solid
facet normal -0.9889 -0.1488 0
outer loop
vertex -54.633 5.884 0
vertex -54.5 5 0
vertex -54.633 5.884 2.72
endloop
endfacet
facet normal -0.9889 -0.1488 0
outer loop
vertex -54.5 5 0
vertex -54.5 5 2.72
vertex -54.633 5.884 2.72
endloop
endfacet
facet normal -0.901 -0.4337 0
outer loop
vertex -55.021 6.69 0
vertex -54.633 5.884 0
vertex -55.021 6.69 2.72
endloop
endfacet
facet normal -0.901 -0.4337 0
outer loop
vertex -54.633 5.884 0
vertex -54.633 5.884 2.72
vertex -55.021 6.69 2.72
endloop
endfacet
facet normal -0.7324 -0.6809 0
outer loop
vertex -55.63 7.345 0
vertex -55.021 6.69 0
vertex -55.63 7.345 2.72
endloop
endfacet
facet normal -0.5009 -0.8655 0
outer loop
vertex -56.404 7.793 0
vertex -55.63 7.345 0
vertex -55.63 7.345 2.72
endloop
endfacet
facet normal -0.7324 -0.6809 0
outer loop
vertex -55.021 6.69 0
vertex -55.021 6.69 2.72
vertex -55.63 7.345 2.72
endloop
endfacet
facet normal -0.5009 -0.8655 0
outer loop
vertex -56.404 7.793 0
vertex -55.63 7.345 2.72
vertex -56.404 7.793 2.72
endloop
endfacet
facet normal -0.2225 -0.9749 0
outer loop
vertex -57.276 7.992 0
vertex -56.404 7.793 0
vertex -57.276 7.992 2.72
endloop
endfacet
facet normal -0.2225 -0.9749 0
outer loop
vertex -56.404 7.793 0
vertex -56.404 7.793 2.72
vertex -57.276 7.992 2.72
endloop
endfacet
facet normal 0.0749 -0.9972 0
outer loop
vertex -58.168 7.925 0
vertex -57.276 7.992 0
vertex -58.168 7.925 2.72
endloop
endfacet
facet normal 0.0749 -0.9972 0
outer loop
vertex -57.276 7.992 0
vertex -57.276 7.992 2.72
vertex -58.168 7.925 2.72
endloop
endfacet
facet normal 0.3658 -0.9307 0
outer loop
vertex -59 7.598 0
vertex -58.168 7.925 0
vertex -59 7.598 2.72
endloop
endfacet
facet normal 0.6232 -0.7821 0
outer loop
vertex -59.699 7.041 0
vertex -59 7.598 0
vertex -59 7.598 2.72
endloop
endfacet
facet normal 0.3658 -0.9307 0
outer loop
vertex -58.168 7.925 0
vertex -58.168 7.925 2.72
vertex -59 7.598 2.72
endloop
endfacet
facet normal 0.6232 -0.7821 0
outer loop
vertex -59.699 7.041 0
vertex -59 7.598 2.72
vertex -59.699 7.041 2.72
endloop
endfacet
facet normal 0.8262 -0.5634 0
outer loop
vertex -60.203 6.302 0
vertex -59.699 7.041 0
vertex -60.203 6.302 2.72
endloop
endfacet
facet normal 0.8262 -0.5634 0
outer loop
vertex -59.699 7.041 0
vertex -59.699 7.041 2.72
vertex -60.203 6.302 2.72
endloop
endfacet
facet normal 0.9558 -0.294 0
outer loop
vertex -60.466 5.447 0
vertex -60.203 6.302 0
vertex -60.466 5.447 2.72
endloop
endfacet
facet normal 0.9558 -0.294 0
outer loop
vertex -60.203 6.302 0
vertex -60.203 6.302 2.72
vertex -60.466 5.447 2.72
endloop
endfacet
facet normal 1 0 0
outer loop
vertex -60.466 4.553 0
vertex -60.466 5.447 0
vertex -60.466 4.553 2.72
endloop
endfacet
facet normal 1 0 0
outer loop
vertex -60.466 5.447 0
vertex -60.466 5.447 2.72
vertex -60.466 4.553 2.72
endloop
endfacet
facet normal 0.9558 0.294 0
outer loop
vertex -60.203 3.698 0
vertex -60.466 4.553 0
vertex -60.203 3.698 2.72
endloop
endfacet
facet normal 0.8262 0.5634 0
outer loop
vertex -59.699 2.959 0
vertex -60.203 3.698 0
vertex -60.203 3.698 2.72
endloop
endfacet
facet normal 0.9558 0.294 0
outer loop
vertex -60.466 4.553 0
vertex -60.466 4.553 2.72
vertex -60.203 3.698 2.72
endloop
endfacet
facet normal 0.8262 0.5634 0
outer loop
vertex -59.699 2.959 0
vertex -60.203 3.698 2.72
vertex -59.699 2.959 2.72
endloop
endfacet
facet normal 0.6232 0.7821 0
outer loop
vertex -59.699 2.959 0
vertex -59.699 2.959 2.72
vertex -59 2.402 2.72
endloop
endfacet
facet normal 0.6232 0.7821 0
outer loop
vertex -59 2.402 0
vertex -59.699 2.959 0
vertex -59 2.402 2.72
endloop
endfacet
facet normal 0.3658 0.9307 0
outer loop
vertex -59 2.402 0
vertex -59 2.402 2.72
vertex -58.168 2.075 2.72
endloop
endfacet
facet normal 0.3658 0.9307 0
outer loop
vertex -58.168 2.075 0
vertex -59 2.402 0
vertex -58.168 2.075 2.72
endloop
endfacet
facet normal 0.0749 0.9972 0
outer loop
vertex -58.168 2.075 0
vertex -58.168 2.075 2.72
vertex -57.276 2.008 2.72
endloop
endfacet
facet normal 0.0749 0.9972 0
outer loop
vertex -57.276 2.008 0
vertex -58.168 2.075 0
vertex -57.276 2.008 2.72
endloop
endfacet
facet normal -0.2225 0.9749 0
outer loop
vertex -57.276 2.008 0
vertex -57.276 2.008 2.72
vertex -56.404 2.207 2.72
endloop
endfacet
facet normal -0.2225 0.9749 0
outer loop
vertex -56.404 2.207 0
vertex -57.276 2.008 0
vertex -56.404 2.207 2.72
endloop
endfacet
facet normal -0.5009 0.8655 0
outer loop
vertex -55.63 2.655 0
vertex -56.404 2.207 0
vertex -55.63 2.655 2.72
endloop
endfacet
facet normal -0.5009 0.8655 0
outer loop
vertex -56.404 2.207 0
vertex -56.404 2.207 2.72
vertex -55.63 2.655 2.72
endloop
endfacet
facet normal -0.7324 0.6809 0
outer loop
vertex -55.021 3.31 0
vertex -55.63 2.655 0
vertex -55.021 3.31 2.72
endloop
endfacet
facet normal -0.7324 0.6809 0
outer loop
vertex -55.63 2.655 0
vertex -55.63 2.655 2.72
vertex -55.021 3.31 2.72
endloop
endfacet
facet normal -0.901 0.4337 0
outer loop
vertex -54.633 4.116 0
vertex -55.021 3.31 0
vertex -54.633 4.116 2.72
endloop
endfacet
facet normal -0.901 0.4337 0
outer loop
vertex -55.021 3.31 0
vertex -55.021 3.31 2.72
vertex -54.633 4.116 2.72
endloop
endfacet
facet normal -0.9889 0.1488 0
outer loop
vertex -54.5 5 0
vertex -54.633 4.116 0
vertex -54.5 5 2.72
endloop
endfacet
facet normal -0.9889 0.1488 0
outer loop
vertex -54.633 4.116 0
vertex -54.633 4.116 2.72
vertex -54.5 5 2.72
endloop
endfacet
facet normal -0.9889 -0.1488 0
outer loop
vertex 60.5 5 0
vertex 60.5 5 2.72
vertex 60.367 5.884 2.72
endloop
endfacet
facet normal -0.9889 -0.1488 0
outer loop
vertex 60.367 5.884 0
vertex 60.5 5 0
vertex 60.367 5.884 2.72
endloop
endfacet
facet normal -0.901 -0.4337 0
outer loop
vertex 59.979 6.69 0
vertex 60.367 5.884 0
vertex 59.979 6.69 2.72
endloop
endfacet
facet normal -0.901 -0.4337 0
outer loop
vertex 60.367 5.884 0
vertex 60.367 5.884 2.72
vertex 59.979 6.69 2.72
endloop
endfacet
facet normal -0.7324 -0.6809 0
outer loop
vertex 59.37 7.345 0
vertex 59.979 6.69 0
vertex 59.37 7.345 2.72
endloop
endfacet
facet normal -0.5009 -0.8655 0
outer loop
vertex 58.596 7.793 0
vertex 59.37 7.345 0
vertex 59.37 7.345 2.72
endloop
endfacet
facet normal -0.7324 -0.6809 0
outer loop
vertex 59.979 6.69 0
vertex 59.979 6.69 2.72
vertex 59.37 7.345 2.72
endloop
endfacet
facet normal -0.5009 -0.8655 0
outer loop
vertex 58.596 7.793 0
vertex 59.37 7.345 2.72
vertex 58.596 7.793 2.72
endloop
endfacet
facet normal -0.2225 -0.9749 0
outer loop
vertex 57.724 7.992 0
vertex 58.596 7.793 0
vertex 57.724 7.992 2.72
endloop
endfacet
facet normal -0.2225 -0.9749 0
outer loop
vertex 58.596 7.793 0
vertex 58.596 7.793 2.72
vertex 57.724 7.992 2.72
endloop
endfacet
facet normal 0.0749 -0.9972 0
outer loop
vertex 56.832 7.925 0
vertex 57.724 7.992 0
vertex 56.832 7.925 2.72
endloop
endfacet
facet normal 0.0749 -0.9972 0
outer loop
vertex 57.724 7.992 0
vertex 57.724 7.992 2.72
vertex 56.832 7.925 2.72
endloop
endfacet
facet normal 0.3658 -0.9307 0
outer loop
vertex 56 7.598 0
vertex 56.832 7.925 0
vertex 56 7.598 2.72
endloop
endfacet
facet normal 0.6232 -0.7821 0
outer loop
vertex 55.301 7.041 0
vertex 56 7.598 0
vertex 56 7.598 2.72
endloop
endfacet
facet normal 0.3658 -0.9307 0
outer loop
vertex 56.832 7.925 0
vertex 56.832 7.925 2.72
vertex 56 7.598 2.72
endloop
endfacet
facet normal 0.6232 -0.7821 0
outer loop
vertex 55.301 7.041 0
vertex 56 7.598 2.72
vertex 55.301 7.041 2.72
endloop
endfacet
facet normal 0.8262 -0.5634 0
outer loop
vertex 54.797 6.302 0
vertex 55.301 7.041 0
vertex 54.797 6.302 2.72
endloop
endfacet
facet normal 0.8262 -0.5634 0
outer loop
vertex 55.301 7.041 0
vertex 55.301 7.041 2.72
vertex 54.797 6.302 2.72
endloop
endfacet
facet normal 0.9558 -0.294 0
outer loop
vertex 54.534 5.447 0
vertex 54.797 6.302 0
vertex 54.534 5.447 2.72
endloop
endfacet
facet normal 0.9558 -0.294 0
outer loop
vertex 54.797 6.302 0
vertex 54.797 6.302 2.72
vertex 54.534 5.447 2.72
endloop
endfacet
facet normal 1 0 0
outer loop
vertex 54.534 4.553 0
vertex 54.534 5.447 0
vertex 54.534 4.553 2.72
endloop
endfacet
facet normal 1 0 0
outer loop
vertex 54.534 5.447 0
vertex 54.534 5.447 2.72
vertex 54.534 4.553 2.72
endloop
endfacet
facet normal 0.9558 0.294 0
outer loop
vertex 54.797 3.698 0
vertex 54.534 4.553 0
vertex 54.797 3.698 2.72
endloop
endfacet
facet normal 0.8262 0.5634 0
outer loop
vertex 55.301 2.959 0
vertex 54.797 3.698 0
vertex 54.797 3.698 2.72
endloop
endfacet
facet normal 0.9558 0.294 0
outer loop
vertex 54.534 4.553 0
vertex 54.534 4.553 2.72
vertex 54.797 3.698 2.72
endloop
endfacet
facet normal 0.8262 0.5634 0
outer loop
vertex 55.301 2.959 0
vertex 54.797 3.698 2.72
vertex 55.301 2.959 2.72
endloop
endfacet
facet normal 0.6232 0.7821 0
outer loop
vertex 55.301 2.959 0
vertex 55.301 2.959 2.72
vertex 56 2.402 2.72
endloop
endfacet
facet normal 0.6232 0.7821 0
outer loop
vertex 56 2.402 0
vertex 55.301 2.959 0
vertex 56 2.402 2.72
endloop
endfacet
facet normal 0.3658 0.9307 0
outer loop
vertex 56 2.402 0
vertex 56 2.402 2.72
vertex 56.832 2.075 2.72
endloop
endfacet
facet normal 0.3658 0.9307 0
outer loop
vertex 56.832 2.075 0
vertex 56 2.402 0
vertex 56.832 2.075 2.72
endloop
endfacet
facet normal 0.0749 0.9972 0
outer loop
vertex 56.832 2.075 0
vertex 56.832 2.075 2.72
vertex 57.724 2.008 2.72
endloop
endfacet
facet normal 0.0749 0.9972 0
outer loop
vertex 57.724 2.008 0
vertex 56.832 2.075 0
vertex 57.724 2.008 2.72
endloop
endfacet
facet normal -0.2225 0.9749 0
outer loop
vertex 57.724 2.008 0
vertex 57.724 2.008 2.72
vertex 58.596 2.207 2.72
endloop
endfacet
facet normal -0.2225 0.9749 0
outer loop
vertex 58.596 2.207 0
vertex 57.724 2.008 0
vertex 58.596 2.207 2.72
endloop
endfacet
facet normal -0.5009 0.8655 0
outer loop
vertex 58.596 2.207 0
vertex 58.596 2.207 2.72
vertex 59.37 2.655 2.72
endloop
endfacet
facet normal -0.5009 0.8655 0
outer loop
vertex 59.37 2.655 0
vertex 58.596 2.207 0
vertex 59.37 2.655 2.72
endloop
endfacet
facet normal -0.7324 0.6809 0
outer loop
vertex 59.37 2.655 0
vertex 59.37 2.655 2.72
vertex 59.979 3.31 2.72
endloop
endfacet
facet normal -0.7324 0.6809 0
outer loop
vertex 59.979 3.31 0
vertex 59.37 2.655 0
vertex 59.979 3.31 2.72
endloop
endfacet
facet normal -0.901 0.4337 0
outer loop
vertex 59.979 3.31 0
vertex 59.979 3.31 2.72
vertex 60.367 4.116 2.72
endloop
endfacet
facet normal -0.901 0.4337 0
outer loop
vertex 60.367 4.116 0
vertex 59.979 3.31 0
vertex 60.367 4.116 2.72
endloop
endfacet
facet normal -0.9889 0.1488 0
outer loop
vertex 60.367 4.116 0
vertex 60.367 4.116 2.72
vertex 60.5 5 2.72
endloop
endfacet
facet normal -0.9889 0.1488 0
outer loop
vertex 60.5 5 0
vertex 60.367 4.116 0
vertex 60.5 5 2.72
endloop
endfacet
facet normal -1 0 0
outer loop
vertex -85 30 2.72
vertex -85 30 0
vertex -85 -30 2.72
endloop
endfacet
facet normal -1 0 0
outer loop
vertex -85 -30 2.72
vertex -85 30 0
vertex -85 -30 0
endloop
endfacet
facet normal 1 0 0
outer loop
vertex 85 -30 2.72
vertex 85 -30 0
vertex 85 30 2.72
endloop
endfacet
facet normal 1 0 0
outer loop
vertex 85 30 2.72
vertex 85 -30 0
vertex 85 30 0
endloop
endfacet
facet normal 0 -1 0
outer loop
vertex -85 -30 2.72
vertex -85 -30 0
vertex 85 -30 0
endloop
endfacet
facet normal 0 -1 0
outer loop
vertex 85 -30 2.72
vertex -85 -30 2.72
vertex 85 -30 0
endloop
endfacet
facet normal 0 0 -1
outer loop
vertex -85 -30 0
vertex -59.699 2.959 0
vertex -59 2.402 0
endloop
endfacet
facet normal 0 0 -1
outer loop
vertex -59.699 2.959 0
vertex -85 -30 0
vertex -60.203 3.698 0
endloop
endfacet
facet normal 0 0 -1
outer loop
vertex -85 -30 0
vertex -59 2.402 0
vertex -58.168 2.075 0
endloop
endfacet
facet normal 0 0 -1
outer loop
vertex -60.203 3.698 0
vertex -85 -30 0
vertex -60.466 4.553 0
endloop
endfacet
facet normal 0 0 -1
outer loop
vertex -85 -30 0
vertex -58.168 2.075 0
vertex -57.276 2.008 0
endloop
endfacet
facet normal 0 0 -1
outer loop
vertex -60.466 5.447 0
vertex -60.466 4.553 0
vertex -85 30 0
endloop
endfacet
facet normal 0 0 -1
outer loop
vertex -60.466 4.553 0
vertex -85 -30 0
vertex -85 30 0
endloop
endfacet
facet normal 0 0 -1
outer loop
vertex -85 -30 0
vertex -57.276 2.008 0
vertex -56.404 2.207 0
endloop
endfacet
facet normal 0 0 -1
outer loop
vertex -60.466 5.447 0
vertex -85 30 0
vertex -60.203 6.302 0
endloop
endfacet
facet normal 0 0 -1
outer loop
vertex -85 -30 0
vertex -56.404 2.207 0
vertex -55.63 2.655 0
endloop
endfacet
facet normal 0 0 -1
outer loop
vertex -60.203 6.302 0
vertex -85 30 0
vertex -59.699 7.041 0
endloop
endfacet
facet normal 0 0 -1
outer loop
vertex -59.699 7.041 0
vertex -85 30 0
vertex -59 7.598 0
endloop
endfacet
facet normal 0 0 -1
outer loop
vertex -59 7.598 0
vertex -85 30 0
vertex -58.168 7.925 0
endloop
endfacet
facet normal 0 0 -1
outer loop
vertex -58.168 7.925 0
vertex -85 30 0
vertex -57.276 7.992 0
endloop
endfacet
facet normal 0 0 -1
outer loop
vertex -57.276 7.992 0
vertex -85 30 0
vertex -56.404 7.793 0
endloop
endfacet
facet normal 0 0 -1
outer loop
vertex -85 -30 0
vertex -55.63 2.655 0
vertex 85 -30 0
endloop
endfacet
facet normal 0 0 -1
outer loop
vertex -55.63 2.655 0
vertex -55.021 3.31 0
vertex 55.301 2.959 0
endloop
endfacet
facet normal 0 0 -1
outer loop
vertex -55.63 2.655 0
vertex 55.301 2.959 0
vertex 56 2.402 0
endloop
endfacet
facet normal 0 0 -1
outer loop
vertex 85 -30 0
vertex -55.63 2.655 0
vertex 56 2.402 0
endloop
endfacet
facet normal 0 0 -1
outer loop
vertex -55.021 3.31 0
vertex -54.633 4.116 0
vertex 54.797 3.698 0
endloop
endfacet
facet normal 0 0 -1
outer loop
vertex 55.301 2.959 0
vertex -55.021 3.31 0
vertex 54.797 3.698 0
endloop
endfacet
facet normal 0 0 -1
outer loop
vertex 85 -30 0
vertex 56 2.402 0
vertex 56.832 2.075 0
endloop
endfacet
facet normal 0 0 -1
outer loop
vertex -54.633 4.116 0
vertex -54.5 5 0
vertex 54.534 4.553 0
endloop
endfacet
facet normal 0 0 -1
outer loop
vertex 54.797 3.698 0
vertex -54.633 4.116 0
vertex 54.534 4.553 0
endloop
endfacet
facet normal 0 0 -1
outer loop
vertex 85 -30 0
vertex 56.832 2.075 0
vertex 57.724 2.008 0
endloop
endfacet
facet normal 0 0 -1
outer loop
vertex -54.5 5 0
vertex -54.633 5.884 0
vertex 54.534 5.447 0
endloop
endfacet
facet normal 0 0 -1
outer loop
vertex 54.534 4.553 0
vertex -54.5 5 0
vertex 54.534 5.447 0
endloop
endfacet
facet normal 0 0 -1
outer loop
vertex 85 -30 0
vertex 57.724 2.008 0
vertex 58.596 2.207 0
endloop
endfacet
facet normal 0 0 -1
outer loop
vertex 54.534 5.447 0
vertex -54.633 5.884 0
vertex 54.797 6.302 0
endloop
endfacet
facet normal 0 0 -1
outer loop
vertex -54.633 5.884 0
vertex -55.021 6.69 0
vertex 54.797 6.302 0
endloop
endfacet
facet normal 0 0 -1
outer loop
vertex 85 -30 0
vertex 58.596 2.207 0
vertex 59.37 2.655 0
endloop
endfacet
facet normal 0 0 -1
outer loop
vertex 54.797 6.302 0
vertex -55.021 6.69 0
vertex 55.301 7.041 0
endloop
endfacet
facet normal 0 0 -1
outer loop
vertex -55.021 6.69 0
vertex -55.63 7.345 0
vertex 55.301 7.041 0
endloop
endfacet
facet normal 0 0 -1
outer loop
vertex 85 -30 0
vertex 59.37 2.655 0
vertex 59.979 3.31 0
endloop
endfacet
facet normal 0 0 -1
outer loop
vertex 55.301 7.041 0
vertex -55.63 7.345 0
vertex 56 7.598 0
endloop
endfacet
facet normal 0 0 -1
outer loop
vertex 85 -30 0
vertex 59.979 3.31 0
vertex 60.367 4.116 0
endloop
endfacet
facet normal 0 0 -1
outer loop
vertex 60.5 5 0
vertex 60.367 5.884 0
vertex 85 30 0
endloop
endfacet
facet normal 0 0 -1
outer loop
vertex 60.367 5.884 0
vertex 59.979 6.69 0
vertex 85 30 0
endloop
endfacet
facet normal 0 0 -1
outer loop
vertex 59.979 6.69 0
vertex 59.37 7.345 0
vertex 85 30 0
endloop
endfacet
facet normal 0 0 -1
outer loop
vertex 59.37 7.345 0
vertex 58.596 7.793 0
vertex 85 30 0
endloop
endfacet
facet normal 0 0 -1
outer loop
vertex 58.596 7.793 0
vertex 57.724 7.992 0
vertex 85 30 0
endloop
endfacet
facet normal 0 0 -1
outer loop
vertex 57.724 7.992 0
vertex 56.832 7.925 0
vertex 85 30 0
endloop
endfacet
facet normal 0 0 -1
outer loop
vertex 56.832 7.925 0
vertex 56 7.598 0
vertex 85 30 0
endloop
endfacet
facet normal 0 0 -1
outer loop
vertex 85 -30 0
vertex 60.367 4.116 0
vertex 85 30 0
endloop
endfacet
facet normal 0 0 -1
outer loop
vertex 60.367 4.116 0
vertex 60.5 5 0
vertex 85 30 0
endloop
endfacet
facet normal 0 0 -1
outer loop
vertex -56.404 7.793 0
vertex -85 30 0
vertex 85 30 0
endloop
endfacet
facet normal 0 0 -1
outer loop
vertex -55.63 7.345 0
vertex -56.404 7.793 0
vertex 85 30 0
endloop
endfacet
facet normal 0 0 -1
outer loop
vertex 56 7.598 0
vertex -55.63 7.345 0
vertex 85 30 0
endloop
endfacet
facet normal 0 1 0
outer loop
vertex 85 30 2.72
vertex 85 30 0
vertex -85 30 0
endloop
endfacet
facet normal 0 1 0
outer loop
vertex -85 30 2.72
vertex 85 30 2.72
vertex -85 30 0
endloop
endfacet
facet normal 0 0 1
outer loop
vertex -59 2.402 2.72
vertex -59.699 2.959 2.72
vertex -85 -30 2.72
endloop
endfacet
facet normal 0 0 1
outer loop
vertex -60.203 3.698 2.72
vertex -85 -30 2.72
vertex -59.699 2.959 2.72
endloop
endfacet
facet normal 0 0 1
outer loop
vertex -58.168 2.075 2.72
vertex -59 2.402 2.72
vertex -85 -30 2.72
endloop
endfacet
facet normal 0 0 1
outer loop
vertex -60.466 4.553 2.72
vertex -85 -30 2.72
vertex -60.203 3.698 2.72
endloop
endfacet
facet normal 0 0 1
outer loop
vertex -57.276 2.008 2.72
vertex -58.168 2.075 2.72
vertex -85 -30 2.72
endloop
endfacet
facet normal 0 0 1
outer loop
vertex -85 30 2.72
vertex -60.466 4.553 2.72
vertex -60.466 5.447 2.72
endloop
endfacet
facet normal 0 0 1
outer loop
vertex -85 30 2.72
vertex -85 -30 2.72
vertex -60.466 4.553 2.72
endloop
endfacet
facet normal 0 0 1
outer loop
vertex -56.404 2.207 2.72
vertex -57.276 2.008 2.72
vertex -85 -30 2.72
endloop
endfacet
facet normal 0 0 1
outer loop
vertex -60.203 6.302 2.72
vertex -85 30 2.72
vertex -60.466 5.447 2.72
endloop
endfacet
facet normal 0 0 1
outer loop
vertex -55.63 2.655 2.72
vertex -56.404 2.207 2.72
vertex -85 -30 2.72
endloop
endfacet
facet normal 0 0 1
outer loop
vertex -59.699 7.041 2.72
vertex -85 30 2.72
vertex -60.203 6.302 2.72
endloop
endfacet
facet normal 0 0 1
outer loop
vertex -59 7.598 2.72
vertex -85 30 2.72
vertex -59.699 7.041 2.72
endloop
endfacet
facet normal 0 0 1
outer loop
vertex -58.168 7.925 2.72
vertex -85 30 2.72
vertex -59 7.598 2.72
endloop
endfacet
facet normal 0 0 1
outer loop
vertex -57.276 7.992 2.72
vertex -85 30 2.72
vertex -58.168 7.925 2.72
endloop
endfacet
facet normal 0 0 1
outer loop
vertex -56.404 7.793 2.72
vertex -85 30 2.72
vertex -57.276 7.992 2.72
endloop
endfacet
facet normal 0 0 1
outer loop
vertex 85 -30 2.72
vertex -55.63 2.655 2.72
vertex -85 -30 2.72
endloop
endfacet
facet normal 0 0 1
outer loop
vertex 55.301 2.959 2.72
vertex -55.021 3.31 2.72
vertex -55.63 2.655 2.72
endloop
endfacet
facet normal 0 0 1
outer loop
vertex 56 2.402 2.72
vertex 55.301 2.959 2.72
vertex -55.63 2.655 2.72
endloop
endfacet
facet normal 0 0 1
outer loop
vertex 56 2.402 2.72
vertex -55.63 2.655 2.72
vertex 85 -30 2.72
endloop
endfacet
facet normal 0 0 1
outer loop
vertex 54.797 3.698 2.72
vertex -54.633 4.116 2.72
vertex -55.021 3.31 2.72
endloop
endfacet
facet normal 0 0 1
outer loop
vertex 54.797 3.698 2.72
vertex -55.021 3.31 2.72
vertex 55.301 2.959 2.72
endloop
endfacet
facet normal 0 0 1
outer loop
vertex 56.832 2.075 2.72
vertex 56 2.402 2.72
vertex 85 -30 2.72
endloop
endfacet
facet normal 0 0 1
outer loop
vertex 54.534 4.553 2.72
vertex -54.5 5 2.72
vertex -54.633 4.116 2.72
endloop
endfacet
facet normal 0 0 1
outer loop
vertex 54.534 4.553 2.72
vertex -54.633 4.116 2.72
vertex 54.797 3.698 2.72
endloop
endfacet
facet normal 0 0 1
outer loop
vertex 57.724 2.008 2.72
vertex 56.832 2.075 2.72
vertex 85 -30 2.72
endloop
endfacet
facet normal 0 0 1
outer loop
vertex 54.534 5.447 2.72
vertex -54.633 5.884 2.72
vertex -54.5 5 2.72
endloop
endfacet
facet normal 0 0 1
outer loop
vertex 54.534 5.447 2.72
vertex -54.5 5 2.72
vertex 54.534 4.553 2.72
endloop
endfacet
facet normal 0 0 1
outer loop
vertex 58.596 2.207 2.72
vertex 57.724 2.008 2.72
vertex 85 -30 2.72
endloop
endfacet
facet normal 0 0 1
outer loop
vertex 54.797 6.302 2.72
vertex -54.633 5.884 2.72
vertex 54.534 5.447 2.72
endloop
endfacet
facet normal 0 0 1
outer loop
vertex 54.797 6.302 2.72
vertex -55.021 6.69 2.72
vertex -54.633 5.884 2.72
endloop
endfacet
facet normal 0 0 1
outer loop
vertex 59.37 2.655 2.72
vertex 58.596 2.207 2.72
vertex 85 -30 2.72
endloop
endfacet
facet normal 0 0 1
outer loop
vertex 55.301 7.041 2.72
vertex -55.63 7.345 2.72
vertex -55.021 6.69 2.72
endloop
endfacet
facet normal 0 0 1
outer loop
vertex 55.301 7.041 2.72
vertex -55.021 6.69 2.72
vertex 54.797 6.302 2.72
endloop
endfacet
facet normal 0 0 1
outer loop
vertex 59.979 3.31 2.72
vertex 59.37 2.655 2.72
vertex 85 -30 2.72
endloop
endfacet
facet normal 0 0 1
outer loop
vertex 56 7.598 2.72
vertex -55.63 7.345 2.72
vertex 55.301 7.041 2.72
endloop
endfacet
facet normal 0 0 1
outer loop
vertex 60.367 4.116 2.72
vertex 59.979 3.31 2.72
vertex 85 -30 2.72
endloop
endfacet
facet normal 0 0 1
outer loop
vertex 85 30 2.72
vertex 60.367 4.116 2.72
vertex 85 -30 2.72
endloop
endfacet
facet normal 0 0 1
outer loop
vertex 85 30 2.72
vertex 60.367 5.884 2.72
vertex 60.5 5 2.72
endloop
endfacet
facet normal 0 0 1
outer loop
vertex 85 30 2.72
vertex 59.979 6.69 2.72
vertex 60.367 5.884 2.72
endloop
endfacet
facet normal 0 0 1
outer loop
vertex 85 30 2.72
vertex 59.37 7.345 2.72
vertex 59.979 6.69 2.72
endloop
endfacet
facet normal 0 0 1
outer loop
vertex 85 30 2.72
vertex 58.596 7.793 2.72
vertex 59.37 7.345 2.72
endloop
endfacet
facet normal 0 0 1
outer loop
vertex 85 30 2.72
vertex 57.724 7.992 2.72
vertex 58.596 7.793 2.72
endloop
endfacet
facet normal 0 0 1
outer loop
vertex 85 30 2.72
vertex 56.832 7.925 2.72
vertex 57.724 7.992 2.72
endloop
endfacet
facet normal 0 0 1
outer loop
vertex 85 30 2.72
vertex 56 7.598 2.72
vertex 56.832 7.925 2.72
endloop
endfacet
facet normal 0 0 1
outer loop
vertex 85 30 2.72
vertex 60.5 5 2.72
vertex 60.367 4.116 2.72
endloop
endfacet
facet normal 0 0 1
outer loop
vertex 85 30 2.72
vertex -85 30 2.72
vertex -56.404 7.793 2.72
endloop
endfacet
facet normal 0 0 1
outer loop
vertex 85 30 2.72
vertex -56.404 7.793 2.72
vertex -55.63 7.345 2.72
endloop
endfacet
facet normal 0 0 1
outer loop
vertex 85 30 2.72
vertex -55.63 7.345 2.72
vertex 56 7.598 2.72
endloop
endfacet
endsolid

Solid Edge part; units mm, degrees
sketch "Sketch1" plane through (0, 0, 0) normal (0, 0, 1) x (1, 0, 0)
  line L0 (-85, -30) -> (85, -30)
  line L1 (85, -30) -> (85, 30)
  line L2 (85, 30) -> (-85, 30)
  line L3 (-85, 30) -> (-85, -30)
  dimension "D1" = 170
  dimension "D2" = 60
extrude "Protrusion1" add sketch "Sketch1" along normal blind 2.72
sketch "Sketch2" plane through (0, 0, 2.72) normal (0, 0, 1) x (1, 0, 0)
  circle A0 centre (-57.5, 5) radius 3
  circle A1 centre (57.5, 5) radius 3
  dimension "D1" = 6
  dimension "D2" = 25
  dimension "D3" = 27.5
extrude "Cutout1" cut sketch "Sketch2" against normal through all
properties material "Nylon, allgemein"
